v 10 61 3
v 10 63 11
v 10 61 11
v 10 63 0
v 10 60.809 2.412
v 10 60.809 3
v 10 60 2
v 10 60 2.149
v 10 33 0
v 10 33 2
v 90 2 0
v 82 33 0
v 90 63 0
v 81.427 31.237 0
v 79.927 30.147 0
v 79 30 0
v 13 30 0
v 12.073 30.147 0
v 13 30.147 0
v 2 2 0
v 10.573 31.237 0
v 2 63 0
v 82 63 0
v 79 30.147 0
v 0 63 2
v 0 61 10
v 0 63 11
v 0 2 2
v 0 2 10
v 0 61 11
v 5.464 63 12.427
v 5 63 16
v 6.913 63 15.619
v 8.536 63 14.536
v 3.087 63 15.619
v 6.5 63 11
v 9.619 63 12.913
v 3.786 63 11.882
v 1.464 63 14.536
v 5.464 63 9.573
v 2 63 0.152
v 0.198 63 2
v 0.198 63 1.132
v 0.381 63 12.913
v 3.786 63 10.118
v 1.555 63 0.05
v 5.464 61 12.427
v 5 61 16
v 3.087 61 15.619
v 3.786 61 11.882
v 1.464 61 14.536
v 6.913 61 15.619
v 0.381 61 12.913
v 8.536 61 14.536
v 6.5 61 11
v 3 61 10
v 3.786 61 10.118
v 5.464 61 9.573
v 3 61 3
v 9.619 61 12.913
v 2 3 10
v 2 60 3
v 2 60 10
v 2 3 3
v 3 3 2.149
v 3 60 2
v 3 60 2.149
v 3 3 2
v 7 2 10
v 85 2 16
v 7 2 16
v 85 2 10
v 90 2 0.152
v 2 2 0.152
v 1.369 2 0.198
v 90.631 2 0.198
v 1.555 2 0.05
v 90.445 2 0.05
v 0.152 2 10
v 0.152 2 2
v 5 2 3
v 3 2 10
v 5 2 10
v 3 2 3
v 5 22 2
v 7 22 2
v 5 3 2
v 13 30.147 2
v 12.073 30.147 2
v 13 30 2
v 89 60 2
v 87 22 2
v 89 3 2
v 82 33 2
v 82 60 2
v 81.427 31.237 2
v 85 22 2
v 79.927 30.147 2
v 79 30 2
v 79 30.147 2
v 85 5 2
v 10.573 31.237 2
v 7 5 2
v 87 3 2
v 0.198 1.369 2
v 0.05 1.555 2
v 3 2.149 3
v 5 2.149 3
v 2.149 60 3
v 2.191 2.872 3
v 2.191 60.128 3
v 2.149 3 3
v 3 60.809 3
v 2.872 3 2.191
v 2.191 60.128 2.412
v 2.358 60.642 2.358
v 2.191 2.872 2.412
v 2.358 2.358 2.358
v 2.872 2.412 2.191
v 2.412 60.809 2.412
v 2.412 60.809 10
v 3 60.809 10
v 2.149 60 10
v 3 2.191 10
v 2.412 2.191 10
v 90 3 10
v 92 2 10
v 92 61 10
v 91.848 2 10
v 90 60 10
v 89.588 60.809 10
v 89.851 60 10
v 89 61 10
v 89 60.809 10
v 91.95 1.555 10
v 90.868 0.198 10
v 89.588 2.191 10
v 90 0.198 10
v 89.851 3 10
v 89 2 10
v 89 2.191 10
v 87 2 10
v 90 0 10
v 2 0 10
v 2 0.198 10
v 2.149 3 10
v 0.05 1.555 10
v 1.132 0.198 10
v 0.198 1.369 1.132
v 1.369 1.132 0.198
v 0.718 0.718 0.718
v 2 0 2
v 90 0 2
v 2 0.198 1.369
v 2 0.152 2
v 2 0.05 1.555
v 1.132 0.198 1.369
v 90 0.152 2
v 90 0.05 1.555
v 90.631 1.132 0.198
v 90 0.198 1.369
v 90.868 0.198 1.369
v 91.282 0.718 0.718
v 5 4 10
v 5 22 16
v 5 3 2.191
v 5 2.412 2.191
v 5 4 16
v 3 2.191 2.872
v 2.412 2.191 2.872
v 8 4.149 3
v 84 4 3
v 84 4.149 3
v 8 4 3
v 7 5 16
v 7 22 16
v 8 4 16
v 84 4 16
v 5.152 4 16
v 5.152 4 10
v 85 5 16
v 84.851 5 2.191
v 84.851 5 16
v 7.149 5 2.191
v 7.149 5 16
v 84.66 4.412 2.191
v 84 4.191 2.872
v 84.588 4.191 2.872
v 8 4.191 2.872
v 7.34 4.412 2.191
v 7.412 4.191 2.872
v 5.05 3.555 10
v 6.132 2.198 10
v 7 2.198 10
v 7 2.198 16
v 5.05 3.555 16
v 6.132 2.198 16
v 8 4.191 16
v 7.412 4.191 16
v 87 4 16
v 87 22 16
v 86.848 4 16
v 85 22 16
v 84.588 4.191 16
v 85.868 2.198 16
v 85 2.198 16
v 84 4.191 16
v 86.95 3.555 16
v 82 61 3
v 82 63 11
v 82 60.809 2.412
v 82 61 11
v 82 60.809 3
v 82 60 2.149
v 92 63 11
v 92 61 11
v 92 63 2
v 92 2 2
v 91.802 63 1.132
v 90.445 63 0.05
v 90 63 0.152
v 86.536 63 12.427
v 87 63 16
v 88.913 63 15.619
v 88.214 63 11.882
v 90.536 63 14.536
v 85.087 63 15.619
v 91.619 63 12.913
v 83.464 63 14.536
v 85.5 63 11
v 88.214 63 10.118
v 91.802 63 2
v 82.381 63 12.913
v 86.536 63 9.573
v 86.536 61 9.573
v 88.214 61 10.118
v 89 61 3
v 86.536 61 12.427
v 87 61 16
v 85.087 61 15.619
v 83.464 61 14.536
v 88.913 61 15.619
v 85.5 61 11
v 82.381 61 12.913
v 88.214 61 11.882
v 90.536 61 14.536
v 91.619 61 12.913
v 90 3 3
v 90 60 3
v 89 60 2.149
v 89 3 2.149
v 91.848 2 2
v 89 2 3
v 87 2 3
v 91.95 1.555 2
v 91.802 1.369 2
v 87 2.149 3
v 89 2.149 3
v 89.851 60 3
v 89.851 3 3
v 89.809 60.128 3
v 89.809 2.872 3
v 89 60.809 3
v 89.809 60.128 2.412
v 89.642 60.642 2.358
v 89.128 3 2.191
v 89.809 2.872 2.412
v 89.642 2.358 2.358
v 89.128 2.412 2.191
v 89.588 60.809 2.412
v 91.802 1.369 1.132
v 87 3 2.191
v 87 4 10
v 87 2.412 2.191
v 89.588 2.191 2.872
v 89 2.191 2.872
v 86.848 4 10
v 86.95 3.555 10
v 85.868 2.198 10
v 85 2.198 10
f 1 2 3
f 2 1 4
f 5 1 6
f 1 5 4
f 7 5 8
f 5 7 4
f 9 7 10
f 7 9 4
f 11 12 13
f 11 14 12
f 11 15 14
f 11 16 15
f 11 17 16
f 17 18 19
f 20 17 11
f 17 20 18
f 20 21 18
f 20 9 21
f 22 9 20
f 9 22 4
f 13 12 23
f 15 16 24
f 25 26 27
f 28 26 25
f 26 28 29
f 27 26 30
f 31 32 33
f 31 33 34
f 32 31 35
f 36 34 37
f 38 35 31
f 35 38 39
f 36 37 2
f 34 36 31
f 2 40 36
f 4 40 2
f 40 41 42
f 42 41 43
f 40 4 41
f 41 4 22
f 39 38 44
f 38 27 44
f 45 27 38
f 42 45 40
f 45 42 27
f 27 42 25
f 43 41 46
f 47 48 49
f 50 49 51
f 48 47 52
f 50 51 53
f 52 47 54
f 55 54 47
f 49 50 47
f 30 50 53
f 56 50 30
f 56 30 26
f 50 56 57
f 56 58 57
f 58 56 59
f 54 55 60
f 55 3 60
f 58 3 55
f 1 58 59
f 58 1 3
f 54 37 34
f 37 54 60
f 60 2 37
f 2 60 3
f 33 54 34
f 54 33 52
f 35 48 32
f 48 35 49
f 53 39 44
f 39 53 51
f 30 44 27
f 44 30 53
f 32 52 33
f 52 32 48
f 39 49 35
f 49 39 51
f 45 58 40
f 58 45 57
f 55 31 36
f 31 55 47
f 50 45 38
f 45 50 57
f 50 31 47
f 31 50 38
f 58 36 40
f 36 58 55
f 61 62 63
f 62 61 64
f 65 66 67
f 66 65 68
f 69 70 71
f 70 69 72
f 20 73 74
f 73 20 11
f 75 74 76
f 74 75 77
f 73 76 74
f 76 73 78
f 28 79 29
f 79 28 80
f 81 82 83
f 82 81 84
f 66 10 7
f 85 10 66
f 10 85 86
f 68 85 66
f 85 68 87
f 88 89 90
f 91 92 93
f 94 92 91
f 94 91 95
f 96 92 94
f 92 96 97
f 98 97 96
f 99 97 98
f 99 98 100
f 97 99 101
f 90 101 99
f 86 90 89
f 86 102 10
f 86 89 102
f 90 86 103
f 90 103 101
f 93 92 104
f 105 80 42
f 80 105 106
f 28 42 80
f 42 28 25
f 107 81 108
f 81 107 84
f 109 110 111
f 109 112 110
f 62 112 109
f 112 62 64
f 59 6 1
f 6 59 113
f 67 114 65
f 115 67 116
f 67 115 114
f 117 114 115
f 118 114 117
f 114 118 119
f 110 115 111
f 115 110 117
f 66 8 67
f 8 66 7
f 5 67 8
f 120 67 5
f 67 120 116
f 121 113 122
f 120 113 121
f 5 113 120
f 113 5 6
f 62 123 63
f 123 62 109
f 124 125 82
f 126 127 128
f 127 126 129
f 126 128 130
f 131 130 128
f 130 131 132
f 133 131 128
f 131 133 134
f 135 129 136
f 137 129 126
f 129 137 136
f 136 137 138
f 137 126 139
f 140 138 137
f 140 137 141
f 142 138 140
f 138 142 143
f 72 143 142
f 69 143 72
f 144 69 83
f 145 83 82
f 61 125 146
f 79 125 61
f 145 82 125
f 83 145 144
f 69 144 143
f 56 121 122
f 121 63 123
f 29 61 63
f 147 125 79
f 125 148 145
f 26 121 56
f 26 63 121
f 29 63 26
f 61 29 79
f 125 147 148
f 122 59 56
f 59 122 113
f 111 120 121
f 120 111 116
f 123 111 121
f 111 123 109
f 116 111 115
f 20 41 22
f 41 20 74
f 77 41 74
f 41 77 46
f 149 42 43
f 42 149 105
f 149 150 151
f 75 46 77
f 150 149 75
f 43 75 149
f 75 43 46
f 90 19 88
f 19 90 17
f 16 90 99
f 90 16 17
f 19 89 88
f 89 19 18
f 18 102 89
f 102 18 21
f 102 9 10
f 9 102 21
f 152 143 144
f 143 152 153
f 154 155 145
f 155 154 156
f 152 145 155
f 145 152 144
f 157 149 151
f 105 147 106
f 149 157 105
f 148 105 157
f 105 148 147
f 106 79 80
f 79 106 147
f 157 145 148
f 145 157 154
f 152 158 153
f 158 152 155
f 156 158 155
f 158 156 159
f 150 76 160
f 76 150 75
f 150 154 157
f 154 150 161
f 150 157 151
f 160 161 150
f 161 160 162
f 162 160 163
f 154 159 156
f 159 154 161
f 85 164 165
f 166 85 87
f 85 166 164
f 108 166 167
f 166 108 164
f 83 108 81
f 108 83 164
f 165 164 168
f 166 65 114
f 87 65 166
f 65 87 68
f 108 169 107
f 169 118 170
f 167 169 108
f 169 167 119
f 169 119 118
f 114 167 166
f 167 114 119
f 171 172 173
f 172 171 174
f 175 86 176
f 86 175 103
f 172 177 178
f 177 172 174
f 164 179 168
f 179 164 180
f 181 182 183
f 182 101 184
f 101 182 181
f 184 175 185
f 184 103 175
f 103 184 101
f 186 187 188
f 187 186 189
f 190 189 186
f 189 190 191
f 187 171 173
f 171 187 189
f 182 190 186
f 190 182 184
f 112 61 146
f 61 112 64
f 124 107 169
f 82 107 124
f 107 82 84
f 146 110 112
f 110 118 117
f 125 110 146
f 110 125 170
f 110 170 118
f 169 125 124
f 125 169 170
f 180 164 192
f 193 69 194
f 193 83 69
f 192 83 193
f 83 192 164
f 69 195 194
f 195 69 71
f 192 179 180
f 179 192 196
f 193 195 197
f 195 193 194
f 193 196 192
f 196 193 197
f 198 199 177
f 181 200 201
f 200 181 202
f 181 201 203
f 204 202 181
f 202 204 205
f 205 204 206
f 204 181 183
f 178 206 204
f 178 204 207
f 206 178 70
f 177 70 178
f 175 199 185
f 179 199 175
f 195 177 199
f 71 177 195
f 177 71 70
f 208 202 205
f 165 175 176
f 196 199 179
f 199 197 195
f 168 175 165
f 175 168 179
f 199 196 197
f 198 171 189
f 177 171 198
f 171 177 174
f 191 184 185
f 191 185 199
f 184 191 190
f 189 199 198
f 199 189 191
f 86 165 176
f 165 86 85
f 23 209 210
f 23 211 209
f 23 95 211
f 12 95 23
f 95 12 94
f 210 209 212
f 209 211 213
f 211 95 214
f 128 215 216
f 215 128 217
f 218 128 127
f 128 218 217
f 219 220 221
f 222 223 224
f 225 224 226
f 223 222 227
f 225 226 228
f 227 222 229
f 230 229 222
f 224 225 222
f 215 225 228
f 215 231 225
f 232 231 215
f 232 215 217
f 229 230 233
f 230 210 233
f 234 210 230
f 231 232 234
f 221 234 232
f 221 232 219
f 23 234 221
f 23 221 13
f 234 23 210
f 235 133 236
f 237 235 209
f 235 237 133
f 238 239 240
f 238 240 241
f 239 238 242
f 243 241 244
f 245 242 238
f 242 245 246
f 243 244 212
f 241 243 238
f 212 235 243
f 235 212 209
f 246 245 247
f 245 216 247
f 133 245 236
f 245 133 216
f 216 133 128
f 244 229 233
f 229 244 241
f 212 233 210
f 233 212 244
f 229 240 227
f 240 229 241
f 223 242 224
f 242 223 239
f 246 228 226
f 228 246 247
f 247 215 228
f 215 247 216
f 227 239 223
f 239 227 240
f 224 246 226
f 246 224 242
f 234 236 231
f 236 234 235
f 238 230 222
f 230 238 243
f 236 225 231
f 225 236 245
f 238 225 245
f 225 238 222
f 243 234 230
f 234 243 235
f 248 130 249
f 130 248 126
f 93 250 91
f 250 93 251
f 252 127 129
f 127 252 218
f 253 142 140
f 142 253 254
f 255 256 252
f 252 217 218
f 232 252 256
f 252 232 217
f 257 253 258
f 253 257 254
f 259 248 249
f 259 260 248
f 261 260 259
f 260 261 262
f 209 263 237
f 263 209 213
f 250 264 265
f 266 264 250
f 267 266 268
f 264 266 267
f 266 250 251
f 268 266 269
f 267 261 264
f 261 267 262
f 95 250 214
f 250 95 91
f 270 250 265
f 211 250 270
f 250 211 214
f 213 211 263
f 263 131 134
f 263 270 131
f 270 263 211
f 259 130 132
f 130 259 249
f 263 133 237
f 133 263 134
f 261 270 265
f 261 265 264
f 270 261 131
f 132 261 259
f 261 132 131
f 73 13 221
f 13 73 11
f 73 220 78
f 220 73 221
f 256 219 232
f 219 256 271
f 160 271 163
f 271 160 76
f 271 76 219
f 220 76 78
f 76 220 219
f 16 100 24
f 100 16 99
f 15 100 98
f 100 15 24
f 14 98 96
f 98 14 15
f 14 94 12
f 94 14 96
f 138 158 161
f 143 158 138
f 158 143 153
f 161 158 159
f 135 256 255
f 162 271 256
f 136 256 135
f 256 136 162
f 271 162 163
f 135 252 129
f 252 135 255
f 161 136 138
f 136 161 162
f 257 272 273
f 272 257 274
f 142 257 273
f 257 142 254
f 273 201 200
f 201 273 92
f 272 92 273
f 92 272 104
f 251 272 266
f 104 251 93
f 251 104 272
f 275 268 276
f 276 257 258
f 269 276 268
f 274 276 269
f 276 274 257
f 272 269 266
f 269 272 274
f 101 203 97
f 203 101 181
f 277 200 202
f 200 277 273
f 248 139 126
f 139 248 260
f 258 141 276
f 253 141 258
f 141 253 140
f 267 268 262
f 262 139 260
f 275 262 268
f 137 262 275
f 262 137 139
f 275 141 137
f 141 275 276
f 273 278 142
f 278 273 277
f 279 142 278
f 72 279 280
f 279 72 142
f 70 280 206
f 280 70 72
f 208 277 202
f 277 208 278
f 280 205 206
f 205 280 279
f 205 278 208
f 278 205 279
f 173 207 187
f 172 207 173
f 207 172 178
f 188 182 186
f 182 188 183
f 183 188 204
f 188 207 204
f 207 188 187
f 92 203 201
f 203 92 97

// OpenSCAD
module corner_fill(len, thick)
{
    translate([0,-(thick / 2),-(thick / 2)]) difference()
    {
        cube([len,thick / 2, thick / 2]);
        rotate([0,90,0]) translate([0,0,-1]) cylinder(h=len + 2, d=thick);
    }
}

module corner_cut(len, thick)
{
    union()
    {
        corner_fill(len, thick);
        translate([0, -(thick / 2), 0])
            cube([len, (thick / 2) + 1, 1]);
        translate([0, 0, -(thick / 2)])
            cube([len, 1, (thick / 2) + 1]);
    }
}

module leg(len, side, thick, hole)
{
    difference()
    {
        union()
        {
            // Angled side
            translate([0,0,0]) cube([side, len, thick]);
            translate([0,0,0]) cube([thick, len, side]);
            // Toe piece
            translate([0,len - thick, 0])
                difference()
            {
                union()
                {
                    cube([side, thick, side + (thick / 2)]);
                    translate([side / 2, thick, side + (thick / 2)])
                        rotate([90,0,0])
                        cylinder(h=thick, d=side);
                }
                translate([side / 2, thick + 1, side + 1])
                    rotate([90,0,0])
                    cylinder(h=thick + 2, d=hole);
            }
            // Inside corner fills
            translate([thick, 0, thick]) rotate([-90,0,90])
                corner_fill(len, thick);
            translate([0,len - thick, thick]) rotate([-90,0,0])
                corner_fill(side, thick);
            translate([thick, len - thick, side]) rotate([0,90,90])
                corner_fill(side, thick);
        }
        // Outside corner cut
        translate([0, -1, 0]) rotate([-90,0,90])
            corner_cut(len + 2, 2 * thick);
    }
}

module leg_with_front(width, thick, leg_len, side, leg_hole)
{
    face_h = 30;
    ridge_h = 20;
    
    // Leg
    translate([0,thick,0])
        leg(leg_len - thick, side, thick, leg_hole);
    
    translate([side, face_h, thick]) rotate ([0,90,180])
        corner_fill(thick, thick * 3);
    
    // face and top plate
    difference()
    {
        union()
        {
            translate([0,0,0]) cube([width, face_h, thick]);
            translate([0,0,0]) cube([width, thick, side]);
        }
        union()
        {
            translate([0,0,-1]) rotate([0,-90,90])
                corner_cut(side + 2, 2 * thick);
            translate([0,0,0]) rotate ([180,0,0])
                corner_cut(width, 2 * thick);
            translate([0, -1, 0]) rotate([-90,0,90])
                corner_cut(face_h + 2, 2 * thick);
        }
    }

    translate([thick,thick,thick]) rotate ([180,0,0])
        corner_fill(1.5 * thick, thick);
    translate([3.5 * thick, 2 * thick, thick])
        rotate ([180,0,0])
        corner_fill(width - (3.5 * thick), thick);
//BOGUS
    translate([thick, thick, thick]) rotate([0,-90,90])
        corner_fill(side - thick, thick);

    // support ridge
    difference()
    {
        translate([2.5 * thick, thick, 0])
            cube([width - (2.5 * thick), thick, (1.5 * side) + 1]);
        translate([2.5 * thick, thick, side]) rotate([0,-90,90])
            corner_cut((side / 2) + 2, 2* thick);
    }
    translate([2.5 * thick, 2*thick, 0])
        cube([thick, ridge_h - thick, (1.5 * side) + 1]);

//BOGUS    
    translate([3.5 * thick, 2 * thick, thick])
        rotate([0,-90,90])
        corner_fill((1.5 * side) + 1 - thick, thick);

//translate([-10,-10,-10])
//corner_cut(6,3);
}



union()
{    
    // left side
    translate([0,0,0]) leg_with_front(46, 2, 63, 10, 3);
    
    // right side
    translate([92,0,0]) mirror () leg_with_front(46, 2, 63, 10, 3);
}
